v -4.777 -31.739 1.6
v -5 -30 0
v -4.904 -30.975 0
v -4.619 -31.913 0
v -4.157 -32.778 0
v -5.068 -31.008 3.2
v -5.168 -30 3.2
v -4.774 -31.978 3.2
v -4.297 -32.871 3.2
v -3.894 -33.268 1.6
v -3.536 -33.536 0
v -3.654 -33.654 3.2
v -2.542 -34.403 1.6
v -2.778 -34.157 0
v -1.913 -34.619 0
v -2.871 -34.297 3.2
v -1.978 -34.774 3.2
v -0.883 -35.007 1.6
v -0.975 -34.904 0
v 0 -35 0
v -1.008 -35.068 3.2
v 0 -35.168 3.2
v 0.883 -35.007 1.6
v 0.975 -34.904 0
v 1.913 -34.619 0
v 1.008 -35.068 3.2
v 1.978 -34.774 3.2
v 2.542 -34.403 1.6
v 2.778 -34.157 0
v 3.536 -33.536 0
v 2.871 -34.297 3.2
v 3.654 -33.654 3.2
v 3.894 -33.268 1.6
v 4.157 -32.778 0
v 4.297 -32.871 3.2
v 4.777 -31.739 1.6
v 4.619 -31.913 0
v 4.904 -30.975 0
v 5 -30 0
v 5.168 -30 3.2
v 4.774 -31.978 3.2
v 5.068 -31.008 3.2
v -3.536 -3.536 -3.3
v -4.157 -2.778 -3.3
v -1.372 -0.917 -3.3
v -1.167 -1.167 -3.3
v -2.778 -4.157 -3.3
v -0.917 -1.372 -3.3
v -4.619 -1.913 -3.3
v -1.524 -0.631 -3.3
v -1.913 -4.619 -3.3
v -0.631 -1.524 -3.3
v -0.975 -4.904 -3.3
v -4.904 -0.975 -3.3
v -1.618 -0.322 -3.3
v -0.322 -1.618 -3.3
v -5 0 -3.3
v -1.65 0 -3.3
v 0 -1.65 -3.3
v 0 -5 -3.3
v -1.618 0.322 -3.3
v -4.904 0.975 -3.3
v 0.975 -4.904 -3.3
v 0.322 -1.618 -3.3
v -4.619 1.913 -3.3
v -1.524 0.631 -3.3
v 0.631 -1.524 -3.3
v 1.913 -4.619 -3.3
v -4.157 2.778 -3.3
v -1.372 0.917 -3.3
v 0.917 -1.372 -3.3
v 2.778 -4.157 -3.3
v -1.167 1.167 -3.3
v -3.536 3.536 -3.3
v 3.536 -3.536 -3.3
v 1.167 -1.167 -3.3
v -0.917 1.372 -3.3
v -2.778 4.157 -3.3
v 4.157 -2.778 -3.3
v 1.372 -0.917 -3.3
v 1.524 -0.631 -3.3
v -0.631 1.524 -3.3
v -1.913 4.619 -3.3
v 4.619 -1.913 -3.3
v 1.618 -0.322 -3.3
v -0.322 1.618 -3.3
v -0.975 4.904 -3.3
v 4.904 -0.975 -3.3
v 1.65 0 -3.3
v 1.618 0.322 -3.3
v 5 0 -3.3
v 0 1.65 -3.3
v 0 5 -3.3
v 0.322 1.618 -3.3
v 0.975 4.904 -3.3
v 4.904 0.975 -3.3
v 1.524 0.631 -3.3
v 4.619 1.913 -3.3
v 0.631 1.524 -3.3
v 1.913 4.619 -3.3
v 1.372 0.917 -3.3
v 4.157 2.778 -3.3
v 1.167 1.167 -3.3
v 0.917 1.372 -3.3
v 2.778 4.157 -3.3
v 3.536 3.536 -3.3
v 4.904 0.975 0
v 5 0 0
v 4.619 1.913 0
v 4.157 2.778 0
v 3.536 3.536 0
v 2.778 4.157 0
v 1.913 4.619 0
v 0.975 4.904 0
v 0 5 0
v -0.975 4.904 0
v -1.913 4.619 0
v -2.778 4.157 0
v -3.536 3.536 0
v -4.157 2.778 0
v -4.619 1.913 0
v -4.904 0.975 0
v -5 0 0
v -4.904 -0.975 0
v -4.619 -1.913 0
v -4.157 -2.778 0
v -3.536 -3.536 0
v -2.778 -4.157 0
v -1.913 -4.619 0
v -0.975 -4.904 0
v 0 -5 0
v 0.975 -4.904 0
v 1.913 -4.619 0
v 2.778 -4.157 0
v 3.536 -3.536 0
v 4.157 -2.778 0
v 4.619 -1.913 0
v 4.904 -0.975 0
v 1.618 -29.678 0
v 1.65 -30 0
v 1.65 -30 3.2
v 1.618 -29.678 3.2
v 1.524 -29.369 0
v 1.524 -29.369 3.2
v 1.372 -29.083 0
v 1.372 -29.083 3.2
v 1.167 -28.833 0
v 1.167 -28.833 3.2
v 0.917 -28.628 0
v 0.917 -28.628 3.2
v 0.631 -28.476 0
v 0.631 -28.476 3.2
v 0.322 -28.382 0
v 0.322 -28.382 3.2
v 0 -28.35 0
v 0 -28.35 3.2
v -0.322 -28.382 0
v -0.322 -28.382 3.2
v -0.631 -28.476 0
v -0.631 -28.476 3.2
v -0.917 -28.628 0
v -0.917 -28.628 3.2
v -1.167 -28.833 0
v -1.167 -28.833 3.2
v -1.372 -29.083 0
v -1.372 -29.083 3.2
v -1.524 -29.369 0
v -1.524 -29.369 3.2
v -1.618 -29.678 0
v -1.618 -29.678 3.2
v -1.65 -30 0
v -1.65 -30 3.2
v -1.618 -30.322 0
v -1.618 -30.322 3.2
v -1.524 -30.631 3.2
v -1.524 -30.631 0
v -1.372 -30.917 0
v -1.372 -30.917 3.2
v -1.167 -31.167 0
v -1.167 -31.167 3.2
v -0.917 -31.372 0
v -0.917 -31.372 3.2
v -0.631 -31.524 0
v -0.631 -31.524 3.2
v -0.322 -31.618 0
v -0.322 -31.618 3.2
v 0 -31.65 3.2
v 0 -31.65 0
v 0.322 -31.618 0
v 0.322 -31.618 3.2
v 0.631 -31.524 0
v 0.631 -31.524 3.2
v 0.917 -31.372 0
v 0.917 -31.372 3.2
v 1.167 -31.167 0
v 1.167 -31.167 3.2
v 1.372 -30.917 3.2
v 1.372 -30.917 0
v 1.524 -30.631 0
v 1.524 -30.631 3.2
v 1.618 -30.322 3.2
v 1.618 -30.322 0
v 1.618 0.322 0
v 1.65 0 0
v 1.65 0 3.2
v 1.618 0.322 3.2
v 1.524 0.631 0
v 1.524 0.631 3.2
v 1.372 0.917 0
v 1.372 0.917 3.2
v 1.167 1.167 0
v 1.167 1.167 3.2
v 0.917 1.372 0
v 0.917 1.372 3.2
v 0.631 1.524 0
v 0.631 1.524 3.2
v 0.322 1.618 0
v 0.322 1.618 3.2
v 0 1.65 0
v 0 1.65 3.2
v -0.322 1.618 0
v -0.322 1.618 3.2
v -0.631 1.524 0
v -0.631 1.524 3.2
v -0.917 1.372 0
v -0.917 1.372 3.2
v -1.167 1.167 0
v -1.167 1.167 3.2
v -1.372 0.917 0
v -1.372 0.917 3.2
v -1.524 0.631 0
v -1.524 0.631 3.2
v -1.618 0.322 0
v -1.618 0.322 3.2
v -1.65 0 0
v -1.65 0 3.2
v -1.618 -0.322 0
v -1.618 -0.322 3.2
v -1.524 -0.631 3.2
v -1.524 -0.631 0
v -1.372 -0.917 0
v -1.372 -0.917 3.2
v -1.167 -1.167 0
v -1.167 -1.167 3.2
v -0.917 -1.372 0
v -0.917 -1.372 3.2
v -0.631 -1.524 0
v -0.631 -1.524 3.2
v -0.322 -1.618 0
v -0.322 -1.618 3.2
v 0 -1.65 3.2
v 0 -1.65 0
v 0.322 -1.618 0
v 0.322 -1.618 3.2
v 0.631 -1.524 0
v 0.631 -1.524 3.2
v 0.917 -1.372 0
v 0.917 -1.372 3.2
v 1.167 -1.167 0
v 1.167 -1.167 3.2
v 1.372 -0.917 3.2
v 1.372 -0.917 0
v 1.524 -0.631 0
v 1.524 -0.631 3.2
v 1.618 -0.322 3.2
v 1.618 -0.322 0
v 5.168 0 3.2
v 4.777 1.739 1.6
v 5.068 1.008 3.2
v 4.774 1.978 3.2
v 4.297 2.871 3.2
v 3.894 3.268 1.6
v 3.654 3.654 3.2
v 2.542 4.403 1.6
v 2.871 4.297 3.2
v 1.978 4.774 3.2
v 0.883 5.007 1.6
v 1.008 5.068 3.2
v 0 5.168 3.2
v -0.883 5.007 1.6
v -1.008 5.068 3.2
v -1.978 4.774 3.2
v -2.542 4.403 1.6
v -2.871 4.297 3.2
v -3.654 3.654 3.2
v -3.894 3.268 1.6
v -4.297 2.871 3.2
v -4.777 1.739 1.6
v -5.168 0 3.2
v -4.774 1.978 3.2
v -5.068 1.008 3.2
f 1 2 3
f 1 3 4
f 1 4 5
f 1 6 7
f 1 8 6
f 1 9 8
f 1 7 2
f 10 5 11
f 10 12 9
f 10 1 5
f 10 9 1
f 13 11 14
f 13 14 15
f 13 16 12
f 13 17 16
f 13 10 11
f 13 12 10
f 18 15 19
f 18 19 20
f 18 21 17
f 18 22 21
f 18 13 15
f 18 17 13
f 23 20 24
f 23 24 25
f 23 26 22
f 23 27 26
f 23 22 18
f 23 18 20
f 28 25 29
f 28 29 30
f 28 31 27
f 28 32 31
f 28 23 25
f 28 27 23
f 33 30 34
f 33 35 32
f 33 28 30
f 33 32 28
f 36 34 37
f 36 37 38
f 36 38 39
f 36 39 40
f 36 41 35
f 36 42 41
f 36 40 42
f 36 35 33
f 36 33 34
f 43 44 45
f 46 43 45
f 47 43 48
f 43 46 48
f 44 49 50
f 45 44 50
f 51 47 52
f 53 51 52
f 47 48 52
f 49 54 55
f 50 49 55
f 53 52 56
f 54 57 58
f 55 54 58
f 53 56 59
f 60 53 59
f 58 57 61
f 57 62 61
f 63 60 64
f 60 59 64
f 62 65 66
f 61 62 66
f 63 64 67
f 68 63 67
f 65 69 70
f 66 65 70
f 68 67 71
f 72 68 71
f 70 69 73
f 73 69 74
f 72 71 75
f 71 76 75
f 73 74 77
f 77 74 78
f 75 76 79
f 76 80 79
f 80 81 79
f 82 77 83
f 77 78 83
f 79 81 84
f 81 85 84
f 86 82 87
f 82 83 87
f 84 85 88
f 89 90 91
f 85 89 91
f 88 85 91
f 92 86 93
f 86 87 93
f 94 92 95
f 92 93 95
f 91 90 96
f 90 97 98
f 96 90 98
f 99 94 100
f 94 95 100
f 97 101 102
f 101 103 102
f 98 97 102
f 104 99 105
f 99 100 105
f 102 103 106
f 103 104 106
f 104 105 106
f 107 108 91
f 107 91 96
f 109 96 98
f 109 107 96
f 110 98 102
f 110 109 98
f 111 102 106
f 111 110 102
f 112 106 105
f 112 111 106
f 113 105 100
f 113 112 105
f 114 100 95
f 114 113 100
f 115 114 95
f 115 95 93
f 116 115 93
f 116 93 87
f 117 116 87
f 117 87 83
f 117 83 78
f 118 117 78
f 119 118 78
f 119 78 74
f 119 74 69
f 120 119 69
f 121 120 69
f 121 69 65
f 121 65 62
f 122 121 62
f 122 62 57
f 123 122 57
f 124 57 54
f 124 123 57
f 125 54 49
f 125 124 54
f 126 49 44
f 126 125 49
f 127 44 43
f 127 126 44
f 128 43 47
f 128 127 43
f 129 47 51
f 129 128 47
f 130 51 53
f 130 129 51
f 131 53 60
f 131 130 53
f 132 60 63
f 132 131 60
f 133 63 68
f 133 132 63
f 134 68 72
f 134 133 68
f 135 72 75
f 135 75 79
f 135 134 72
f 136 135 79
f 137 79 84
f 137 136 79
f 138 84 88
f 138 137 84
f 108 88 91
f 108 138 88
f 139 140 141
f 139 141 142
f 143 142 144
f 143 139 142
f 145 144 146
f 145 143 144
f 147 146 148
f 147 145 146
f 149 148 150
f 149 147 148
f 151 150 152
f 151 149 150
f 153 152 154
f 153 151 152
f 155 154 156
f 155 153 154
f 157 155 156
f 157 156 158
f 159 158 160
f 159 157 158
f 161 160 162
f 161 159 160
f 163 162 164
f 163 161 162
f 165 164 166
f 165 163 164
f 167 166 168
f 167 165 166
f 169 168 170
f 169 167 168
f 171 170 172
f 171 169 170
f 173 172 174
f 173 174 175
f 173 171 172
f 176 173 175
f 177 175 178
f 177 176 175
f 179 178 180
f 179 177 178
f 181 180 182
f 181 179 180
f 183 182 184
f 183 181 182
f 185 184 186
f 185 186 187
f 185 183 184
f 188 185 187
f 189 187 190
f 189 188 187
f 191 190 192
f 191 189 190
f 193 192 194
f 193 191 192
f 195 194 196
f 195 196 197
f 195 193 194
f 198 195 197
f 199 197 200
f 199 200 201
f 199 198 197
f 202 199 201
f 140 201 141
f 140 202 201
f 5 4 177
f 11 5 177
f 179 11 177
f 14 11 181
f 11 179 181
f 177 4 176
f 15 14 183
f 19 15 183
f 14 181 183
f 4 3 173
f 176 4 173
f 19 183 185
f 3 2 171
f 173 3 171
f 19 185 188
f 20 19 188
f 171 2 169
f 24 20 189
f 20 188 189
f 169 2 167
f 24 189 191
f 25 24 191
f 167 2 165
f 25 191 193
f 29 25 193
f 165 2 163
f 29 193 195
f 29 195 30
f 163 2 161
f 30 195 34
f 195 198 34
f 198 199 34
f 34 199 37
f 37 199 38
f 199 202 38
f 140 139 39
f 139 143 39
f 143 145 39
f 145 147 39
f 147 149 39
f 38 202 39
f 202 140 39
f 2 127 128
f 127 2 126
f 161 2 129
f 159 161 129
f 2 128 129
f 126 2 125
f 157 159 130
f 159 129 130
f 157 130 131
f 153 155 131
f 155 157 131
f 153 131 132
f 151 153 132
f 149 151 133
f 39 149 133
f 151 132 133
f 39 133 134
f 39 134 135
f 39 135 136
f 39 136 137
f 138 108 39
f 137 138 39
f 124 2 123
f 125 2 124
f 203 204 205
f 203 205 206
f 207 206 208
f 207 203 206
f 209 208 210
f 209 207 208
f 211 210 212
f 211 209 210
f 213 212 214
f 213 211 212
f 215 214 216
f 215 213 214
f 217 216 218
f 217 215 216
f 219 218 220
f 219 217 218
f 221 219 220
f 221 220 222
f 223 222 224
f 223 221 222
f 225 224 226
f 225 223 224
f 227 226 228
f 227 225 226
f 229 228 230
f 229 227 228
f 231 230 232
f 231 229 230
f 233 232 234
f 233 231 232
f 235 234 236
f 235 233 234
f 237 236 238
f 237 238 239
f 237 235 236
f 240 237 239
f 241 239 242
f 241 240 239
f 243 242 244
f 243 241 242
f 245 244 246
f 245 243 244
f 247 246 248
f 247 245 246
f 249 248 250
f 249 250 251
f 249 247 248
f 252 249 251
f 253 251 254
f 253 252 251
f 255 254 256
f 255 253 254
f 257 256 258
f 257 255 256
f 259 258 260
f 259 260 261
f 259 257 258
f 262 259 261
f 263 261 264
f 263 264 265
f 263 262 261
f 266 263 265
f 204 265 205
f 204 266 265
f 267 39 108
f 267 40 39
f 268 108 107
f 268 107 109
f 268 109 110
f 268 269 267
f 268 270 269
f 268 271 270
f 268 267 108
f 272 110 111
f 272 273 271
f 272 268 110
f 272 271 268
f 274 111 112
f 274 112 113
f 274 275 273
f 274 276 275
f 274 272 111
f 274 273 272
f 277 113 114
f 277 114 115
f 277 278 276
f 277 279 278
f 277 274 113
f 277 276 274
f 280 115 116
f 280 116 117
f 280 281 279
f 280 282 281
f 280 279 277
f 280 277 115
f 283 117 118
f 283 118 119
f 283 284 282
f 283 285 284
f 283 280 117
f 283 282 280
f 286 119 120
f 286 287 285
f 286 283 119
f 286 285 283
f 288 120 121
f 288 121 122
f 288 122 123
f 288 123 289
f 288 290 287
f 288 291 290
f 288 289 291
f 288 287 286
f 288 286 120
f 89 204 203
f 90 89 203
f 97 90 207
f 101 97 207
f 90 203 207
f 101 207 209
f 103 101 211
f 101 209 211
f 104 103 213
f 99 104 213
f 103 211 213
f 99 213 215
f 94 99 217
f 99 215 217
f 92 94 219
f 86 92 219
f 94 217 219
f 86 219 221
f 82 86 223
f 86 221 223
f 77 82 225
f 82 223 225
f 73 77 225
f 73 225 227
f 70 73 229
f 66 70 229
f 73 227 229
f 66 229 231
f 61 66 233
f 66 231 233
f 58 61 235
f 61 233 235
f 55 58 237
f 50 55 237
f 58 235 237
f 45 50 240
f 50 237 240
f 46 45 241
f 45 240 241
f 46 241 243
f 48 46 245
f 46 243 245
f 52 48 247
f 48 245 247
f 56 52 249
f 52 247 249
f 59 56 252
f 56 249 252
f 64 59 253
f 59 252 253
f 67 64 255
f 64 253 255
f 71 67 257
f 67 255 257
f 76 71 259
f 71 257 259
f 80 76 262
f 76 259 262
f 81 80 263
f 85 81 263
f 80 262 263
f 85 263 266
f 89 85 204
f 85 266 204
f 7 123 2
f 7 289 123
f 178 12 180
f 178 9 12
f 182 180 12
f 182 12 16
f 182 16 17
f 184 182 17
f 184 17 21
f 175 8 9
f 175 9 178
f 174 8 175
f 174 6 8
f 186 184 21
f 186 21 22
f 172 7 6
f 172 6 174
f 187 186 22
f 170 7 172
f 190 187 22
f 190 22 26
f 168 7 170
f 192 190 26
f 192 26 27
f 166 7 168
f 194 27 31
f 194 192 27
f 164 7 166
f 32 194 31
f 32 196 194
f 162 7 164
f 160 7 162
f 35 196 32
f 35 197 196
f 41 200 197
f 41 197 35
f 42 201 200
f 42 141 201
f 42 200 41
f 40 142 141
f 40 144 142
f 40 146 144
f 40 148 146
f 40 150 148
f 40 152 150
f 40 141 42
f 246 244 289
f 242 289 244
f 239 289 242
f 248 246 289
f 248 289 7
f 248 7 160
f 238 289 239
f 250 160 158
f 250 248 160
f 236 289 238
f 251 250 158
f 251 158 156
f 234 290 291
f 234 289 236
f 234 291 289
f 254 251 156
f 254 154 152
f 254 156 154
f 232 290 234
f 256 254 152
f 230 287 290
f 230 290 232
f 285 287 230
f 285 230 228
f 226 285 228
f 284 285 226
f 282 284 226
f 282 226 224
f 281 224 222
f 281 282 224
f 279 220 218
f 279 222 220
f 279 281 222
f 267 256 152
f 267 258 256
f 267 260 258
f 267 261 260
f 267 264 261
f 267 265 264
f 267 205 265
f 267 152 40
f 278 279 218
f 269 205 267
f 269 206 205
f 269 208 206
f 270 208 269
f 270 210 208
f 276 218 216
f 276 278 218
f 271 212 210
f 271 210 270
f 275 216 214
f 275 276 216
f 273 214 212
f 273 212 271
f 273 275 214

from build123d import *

# Parameters (mm, degrees)
F1_R     = 1.65
F2_DEPTH = 3.2
F2_TAPER = -3
F0_R     = 1.65
F3_DEPTH = 3.2
F5_R     = 5
F6_DEPTH = 3.3
F4_R     = 1.65
F7_DEPTH = 3.3
F8_R     = 1.65
F9_DEPTH = 3.2


with BuildPart() as f2:
    # F1 (on Top) → F2 (new body)
    with BuildSketch(Plane.XY):
        with BuildLine():
            ThreePointArc((-5, 0), (0, -5), (5, 0))
            ThreePointArc((5, 0), (0, 5), (-5, 0))
        make_face()
        Circle(F1_R, mode=Mode.SUBTRACT)
        with BuildLine():
            Line((5, -30), (5, 0))
            ThreePointArc((5, 0), (0, -5), (-5, 0))
            Line((-5, 0), (-5, -30))
            ThreePointArc((-5, -30), (0, -25), (5, -30))
        make_face()
        with BuildLine():
            ThreePointArc((-5, -30), (0, -35), (5, -30))
            ThreePointArc((5, -30), (0, -25), (-5, -30))
        make_face()
    extrude(amount=F2_DEPTH, taper=F2_TAPER)

    # F0 (on Top) → F3 (cut)
    with BuildSketch(Plane.XY):
        Circle(F0_R)
    extrude(amount=F3_DEPTH, mode=Mode.SUBTRACT)

    # F5 (on Top) → F6 (join)
    with BuildSketch(Plane.XY):
        Circle(F5_R)
    extrude(amount=-F6_DEPTH)

    # F4 (on Top) → F7 (cut)
    with BuildSketch(Plane.XY):
        Circle(F4_R)
    extrude(amount=-F7_DEPTH, mode=Mode.SUBTRACT)

    # F8 (on Top) → F9 (cut)
    with BuildSketch(Plane.XY):
        with Locations((0, -30)):
            Circle(F8_R)
    extrude(amount=F9_DEPTH, mode=Mode.SUBTRACT)


solid = f2.part
